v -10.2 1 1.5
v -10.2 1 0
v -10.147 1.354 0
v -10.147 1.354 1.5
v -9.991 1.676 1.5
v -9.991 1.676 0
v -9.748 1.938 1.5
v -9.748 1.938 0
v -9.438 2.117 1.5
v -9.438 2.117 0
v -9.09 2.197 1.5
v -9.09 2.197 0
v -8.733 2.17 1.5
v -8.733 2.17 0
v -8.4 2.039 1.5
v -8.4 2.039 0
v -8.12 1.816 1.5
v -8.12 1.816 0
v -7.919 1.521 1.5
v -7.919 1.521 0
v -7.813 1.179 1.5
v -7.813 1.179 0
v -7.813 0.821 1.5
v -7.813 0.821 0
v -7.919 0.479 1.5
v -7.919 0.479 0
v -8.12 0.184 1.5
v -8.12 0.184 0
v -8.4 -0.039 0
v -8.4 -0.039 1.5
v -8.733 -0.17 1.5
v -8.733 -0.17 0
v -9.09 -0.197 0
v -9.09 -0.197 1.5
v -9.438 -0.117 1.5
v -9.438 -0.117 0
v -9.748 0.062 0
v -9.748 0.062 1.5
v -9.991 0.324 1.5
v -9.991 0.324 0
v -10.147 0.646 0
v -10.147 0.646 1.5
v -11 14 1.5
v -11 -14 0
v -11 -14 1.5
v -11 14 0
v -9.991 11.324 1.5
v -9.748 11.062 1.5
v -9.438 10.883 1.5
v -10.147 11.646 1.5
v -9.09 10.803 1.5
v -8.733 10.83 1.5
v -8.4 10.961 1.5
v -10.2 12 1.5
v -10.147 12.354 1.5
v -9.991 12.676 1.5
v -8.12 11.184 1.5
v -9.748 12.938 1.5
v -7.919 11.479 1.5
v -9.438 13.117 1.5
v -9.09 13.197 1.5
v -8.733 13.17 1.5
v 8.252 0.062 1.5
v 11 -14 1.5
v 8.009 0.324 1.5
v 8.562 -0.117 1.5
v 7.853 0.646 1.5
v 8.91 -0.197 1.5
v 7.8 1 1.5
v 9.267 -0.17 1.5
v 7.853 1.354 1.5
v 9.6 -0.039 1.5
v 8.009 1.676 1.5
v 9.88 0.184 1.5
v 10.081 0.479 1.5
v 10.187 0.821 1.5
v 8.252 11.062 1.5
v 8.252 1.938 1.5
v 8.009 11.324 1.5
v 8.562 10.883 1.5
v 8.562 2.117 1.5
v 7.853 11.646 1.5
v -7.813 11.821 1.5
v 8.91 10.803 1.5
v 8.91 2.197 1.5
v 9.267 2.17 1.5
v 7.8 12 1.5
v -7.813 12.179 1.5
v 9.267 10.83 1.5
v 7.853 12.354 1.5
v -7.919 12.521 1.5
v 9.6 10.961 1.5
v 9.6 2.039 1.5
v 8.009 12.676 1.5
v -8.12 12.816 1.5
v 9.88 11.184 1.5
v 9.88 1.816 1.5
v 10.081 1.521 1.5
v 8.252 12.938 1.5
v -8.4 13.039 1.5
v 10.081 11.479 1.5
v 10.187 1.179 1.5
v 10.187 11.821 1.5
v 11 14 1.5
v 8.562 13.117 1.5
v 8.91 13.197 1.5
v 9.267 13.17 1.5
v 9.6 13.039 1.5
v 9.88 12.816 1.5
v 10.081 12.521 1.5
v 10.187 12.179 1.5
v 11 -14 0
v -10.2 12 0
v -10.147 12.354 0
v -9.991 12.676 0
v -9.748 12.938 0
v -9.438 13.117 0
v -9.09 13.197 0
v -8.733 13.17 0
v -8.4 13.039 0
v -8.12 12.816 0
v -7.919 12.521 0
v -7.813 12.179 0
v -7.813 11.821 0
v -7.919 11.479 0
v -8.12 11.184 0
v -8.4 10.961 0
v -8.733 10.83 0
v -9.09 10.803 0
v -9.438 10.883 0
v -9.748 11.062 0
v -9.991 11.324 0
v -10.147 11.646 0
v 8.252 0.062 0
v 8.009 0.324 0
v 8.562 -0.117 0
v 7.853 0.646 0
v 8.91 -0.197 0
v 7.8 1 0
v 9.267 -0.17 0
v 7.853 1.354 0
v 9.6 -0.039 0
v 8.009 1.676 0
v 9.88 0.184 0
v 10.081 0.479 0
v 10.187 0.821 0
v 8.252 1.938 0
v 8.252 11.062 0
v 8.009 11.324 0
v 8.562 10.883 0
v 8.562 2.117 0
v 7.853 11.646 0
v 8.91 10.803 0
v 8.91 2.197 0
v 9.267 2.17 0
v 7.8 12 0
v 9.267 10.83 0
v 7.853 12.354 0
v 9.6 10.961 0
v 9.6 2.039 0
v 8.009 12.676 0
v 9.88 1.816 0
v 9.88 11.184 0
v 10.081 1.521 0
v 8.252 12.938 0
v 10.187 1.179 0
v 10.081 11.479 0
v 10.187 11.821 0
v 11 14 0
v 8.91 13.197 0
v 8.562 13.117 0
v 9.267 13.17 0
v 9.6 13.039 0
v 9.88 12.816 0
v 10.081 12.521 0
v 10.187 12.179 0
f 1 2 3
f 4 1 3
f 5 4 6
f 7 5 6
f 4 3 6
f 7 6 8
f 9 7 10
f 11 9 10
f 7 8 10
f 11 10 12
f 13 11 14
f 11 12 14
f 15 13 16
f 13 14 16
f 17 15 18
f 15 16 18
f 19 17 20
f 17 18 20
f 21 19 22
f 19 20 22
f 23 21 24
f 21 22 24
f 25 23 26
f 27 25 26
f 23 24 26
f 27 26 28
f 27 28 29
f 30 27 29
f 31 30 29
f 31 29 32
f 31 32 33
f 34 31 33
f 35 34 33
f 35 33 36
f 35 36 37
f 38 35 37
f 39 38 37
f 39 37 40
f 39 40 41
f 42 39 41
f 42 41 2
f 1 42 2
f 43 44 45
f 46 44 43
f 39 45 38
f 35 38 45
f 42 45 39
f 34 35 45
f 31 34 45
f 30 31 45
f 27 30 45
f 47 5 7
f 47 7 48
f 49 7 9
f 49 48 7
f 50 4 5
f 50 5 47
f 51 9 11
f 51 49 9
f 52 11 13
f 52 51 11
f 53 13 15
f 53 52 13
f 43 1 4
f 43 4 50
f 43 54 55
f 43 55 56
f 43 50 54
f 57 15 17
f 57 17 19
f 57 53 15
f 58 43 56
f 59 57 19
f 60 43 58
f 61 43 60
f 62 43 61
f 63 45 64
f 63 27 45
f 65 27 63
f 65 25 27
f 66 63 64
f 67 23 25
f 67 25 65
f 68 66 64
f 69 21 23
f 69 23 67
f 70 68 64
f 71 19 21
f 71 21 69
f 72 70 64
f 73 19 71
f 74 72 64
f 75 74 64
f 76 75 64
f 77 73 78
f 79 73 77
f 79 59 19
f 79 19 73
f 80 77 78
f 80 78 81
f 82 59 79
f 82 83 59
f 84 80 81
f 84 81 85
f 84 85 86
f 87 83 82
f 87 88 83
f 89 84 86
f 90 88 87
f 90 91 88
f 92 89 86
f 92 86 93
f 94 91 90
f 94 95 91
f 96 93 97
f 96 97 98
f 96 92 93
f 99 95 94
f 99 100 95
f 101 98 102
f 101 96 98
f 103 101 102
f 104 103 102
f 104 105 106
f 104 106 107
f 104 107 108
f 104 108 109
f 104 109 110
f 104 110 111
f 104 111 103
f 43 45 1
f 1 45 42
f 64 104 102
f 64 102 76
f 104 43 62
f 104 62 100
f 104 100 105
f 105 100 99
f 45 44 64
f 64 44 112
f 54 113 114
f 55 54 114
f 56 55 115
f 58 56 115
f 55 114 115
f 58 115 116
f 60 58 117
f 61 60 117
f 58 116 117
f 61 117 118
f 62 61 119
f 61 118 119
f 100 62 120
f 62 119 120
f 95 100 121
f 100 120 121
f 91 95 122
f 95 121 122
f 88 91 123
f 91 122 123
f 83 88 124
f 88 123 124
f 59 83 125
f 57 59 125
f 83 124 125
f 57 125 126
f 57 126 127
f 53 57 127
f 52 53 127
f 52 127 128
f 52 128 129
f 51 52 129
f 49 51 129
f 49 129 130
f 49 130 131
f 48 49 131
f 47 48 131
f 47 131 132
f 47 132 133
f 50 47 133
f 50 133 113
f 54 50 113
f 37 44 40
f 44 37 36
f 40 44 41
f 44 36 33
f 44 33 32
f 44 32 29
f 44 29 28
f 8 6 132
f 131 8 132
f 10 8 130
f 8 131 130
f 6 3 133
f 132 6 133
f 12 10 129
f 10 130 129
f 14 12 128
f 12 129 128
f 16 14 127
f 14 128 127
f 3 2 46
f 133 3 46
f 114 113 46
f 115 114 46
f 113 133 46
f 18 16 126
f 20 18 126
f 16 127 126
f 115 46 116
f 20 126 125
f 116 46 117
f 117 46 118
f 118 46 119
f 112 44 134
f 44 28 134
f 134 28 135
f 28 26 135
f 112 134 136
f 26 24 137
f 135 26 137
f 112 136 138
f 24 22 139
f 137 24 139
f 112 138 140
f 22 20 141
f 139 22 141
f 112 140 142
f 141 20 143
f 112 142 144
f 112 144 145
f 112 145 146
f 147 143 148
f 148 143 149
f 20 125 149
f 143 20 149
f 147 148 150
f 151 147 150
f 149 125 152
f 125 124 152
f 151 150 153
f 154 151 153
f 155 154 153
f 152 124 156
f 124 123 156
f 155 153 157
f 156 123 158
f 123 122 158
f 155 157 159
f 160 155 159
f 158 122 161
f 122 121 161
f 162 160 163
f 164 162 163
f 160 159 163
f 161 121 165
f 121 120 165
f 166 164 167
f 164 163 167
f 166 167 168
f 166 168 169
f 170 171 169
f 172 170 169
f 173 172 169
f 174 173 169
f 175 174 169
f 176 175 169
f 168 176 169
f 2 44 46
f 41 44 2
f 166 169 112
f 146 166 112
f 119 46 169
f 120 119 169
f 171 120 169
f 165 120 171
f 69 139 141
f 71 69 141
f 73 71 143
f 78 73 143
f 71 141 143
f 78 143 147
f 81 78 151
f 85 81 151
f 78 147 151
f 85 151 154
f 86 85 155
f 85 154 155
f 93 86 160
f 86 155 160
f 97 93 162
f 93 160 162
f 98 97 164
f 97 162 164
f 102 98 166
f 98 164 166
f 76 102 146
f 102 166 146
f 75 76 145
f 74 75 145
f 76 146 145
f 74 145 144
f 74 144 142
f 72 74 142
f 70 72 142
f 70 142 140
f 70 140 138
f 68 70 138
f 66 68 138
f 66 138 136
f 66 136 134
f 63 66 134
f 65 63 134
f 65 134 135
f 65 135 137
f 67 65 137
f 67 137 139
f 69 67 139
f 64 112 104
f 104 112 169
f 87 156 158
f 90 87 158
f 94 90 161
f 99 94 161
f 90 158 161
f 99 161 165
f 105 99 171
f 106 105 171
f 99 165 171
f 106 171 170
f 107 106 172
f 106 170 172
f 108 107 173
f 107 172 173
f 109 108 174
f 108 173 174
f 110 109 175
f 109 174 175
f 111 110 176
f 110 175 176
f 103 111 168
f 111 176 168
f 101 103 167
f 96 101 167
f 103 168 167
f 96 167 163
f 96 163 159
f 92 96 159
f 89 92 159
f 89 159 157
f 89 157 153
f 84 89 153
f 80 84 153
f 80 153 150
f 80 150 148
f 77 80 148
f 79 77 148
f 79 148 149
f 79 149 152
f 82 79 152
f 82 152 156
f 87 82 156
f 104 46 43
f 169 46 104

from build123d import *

# Parameters (mm, degrees)
SKETCH_1_W         = 22
SKETCH_1_H         = 28
EXTRUDE_1_DEPTH    = 1.5
HOLE_WIZARD_M2_1_D = 2.4


with BuildPart() as part:
    # ｽｹｯﾁ1 → ﾎﾞｽ - 押し出し1 (new body)
    with BuildSketch(Plane.XY):
        Rectangle(SKETCH_1_W, SKETCH_1_H)
    extrude(amount=EXTRUDE_1_DEPTH)

    # M2 すきま穴1 (through all)
    with Locations(Plane.XY.offset(1.5)):
        with Locations((-9, 12), (9, 12), (-9, 1), (9, 1)):
            Hole(HOLE_WIZARD_M2_1_D / 2)


solid = part.part
